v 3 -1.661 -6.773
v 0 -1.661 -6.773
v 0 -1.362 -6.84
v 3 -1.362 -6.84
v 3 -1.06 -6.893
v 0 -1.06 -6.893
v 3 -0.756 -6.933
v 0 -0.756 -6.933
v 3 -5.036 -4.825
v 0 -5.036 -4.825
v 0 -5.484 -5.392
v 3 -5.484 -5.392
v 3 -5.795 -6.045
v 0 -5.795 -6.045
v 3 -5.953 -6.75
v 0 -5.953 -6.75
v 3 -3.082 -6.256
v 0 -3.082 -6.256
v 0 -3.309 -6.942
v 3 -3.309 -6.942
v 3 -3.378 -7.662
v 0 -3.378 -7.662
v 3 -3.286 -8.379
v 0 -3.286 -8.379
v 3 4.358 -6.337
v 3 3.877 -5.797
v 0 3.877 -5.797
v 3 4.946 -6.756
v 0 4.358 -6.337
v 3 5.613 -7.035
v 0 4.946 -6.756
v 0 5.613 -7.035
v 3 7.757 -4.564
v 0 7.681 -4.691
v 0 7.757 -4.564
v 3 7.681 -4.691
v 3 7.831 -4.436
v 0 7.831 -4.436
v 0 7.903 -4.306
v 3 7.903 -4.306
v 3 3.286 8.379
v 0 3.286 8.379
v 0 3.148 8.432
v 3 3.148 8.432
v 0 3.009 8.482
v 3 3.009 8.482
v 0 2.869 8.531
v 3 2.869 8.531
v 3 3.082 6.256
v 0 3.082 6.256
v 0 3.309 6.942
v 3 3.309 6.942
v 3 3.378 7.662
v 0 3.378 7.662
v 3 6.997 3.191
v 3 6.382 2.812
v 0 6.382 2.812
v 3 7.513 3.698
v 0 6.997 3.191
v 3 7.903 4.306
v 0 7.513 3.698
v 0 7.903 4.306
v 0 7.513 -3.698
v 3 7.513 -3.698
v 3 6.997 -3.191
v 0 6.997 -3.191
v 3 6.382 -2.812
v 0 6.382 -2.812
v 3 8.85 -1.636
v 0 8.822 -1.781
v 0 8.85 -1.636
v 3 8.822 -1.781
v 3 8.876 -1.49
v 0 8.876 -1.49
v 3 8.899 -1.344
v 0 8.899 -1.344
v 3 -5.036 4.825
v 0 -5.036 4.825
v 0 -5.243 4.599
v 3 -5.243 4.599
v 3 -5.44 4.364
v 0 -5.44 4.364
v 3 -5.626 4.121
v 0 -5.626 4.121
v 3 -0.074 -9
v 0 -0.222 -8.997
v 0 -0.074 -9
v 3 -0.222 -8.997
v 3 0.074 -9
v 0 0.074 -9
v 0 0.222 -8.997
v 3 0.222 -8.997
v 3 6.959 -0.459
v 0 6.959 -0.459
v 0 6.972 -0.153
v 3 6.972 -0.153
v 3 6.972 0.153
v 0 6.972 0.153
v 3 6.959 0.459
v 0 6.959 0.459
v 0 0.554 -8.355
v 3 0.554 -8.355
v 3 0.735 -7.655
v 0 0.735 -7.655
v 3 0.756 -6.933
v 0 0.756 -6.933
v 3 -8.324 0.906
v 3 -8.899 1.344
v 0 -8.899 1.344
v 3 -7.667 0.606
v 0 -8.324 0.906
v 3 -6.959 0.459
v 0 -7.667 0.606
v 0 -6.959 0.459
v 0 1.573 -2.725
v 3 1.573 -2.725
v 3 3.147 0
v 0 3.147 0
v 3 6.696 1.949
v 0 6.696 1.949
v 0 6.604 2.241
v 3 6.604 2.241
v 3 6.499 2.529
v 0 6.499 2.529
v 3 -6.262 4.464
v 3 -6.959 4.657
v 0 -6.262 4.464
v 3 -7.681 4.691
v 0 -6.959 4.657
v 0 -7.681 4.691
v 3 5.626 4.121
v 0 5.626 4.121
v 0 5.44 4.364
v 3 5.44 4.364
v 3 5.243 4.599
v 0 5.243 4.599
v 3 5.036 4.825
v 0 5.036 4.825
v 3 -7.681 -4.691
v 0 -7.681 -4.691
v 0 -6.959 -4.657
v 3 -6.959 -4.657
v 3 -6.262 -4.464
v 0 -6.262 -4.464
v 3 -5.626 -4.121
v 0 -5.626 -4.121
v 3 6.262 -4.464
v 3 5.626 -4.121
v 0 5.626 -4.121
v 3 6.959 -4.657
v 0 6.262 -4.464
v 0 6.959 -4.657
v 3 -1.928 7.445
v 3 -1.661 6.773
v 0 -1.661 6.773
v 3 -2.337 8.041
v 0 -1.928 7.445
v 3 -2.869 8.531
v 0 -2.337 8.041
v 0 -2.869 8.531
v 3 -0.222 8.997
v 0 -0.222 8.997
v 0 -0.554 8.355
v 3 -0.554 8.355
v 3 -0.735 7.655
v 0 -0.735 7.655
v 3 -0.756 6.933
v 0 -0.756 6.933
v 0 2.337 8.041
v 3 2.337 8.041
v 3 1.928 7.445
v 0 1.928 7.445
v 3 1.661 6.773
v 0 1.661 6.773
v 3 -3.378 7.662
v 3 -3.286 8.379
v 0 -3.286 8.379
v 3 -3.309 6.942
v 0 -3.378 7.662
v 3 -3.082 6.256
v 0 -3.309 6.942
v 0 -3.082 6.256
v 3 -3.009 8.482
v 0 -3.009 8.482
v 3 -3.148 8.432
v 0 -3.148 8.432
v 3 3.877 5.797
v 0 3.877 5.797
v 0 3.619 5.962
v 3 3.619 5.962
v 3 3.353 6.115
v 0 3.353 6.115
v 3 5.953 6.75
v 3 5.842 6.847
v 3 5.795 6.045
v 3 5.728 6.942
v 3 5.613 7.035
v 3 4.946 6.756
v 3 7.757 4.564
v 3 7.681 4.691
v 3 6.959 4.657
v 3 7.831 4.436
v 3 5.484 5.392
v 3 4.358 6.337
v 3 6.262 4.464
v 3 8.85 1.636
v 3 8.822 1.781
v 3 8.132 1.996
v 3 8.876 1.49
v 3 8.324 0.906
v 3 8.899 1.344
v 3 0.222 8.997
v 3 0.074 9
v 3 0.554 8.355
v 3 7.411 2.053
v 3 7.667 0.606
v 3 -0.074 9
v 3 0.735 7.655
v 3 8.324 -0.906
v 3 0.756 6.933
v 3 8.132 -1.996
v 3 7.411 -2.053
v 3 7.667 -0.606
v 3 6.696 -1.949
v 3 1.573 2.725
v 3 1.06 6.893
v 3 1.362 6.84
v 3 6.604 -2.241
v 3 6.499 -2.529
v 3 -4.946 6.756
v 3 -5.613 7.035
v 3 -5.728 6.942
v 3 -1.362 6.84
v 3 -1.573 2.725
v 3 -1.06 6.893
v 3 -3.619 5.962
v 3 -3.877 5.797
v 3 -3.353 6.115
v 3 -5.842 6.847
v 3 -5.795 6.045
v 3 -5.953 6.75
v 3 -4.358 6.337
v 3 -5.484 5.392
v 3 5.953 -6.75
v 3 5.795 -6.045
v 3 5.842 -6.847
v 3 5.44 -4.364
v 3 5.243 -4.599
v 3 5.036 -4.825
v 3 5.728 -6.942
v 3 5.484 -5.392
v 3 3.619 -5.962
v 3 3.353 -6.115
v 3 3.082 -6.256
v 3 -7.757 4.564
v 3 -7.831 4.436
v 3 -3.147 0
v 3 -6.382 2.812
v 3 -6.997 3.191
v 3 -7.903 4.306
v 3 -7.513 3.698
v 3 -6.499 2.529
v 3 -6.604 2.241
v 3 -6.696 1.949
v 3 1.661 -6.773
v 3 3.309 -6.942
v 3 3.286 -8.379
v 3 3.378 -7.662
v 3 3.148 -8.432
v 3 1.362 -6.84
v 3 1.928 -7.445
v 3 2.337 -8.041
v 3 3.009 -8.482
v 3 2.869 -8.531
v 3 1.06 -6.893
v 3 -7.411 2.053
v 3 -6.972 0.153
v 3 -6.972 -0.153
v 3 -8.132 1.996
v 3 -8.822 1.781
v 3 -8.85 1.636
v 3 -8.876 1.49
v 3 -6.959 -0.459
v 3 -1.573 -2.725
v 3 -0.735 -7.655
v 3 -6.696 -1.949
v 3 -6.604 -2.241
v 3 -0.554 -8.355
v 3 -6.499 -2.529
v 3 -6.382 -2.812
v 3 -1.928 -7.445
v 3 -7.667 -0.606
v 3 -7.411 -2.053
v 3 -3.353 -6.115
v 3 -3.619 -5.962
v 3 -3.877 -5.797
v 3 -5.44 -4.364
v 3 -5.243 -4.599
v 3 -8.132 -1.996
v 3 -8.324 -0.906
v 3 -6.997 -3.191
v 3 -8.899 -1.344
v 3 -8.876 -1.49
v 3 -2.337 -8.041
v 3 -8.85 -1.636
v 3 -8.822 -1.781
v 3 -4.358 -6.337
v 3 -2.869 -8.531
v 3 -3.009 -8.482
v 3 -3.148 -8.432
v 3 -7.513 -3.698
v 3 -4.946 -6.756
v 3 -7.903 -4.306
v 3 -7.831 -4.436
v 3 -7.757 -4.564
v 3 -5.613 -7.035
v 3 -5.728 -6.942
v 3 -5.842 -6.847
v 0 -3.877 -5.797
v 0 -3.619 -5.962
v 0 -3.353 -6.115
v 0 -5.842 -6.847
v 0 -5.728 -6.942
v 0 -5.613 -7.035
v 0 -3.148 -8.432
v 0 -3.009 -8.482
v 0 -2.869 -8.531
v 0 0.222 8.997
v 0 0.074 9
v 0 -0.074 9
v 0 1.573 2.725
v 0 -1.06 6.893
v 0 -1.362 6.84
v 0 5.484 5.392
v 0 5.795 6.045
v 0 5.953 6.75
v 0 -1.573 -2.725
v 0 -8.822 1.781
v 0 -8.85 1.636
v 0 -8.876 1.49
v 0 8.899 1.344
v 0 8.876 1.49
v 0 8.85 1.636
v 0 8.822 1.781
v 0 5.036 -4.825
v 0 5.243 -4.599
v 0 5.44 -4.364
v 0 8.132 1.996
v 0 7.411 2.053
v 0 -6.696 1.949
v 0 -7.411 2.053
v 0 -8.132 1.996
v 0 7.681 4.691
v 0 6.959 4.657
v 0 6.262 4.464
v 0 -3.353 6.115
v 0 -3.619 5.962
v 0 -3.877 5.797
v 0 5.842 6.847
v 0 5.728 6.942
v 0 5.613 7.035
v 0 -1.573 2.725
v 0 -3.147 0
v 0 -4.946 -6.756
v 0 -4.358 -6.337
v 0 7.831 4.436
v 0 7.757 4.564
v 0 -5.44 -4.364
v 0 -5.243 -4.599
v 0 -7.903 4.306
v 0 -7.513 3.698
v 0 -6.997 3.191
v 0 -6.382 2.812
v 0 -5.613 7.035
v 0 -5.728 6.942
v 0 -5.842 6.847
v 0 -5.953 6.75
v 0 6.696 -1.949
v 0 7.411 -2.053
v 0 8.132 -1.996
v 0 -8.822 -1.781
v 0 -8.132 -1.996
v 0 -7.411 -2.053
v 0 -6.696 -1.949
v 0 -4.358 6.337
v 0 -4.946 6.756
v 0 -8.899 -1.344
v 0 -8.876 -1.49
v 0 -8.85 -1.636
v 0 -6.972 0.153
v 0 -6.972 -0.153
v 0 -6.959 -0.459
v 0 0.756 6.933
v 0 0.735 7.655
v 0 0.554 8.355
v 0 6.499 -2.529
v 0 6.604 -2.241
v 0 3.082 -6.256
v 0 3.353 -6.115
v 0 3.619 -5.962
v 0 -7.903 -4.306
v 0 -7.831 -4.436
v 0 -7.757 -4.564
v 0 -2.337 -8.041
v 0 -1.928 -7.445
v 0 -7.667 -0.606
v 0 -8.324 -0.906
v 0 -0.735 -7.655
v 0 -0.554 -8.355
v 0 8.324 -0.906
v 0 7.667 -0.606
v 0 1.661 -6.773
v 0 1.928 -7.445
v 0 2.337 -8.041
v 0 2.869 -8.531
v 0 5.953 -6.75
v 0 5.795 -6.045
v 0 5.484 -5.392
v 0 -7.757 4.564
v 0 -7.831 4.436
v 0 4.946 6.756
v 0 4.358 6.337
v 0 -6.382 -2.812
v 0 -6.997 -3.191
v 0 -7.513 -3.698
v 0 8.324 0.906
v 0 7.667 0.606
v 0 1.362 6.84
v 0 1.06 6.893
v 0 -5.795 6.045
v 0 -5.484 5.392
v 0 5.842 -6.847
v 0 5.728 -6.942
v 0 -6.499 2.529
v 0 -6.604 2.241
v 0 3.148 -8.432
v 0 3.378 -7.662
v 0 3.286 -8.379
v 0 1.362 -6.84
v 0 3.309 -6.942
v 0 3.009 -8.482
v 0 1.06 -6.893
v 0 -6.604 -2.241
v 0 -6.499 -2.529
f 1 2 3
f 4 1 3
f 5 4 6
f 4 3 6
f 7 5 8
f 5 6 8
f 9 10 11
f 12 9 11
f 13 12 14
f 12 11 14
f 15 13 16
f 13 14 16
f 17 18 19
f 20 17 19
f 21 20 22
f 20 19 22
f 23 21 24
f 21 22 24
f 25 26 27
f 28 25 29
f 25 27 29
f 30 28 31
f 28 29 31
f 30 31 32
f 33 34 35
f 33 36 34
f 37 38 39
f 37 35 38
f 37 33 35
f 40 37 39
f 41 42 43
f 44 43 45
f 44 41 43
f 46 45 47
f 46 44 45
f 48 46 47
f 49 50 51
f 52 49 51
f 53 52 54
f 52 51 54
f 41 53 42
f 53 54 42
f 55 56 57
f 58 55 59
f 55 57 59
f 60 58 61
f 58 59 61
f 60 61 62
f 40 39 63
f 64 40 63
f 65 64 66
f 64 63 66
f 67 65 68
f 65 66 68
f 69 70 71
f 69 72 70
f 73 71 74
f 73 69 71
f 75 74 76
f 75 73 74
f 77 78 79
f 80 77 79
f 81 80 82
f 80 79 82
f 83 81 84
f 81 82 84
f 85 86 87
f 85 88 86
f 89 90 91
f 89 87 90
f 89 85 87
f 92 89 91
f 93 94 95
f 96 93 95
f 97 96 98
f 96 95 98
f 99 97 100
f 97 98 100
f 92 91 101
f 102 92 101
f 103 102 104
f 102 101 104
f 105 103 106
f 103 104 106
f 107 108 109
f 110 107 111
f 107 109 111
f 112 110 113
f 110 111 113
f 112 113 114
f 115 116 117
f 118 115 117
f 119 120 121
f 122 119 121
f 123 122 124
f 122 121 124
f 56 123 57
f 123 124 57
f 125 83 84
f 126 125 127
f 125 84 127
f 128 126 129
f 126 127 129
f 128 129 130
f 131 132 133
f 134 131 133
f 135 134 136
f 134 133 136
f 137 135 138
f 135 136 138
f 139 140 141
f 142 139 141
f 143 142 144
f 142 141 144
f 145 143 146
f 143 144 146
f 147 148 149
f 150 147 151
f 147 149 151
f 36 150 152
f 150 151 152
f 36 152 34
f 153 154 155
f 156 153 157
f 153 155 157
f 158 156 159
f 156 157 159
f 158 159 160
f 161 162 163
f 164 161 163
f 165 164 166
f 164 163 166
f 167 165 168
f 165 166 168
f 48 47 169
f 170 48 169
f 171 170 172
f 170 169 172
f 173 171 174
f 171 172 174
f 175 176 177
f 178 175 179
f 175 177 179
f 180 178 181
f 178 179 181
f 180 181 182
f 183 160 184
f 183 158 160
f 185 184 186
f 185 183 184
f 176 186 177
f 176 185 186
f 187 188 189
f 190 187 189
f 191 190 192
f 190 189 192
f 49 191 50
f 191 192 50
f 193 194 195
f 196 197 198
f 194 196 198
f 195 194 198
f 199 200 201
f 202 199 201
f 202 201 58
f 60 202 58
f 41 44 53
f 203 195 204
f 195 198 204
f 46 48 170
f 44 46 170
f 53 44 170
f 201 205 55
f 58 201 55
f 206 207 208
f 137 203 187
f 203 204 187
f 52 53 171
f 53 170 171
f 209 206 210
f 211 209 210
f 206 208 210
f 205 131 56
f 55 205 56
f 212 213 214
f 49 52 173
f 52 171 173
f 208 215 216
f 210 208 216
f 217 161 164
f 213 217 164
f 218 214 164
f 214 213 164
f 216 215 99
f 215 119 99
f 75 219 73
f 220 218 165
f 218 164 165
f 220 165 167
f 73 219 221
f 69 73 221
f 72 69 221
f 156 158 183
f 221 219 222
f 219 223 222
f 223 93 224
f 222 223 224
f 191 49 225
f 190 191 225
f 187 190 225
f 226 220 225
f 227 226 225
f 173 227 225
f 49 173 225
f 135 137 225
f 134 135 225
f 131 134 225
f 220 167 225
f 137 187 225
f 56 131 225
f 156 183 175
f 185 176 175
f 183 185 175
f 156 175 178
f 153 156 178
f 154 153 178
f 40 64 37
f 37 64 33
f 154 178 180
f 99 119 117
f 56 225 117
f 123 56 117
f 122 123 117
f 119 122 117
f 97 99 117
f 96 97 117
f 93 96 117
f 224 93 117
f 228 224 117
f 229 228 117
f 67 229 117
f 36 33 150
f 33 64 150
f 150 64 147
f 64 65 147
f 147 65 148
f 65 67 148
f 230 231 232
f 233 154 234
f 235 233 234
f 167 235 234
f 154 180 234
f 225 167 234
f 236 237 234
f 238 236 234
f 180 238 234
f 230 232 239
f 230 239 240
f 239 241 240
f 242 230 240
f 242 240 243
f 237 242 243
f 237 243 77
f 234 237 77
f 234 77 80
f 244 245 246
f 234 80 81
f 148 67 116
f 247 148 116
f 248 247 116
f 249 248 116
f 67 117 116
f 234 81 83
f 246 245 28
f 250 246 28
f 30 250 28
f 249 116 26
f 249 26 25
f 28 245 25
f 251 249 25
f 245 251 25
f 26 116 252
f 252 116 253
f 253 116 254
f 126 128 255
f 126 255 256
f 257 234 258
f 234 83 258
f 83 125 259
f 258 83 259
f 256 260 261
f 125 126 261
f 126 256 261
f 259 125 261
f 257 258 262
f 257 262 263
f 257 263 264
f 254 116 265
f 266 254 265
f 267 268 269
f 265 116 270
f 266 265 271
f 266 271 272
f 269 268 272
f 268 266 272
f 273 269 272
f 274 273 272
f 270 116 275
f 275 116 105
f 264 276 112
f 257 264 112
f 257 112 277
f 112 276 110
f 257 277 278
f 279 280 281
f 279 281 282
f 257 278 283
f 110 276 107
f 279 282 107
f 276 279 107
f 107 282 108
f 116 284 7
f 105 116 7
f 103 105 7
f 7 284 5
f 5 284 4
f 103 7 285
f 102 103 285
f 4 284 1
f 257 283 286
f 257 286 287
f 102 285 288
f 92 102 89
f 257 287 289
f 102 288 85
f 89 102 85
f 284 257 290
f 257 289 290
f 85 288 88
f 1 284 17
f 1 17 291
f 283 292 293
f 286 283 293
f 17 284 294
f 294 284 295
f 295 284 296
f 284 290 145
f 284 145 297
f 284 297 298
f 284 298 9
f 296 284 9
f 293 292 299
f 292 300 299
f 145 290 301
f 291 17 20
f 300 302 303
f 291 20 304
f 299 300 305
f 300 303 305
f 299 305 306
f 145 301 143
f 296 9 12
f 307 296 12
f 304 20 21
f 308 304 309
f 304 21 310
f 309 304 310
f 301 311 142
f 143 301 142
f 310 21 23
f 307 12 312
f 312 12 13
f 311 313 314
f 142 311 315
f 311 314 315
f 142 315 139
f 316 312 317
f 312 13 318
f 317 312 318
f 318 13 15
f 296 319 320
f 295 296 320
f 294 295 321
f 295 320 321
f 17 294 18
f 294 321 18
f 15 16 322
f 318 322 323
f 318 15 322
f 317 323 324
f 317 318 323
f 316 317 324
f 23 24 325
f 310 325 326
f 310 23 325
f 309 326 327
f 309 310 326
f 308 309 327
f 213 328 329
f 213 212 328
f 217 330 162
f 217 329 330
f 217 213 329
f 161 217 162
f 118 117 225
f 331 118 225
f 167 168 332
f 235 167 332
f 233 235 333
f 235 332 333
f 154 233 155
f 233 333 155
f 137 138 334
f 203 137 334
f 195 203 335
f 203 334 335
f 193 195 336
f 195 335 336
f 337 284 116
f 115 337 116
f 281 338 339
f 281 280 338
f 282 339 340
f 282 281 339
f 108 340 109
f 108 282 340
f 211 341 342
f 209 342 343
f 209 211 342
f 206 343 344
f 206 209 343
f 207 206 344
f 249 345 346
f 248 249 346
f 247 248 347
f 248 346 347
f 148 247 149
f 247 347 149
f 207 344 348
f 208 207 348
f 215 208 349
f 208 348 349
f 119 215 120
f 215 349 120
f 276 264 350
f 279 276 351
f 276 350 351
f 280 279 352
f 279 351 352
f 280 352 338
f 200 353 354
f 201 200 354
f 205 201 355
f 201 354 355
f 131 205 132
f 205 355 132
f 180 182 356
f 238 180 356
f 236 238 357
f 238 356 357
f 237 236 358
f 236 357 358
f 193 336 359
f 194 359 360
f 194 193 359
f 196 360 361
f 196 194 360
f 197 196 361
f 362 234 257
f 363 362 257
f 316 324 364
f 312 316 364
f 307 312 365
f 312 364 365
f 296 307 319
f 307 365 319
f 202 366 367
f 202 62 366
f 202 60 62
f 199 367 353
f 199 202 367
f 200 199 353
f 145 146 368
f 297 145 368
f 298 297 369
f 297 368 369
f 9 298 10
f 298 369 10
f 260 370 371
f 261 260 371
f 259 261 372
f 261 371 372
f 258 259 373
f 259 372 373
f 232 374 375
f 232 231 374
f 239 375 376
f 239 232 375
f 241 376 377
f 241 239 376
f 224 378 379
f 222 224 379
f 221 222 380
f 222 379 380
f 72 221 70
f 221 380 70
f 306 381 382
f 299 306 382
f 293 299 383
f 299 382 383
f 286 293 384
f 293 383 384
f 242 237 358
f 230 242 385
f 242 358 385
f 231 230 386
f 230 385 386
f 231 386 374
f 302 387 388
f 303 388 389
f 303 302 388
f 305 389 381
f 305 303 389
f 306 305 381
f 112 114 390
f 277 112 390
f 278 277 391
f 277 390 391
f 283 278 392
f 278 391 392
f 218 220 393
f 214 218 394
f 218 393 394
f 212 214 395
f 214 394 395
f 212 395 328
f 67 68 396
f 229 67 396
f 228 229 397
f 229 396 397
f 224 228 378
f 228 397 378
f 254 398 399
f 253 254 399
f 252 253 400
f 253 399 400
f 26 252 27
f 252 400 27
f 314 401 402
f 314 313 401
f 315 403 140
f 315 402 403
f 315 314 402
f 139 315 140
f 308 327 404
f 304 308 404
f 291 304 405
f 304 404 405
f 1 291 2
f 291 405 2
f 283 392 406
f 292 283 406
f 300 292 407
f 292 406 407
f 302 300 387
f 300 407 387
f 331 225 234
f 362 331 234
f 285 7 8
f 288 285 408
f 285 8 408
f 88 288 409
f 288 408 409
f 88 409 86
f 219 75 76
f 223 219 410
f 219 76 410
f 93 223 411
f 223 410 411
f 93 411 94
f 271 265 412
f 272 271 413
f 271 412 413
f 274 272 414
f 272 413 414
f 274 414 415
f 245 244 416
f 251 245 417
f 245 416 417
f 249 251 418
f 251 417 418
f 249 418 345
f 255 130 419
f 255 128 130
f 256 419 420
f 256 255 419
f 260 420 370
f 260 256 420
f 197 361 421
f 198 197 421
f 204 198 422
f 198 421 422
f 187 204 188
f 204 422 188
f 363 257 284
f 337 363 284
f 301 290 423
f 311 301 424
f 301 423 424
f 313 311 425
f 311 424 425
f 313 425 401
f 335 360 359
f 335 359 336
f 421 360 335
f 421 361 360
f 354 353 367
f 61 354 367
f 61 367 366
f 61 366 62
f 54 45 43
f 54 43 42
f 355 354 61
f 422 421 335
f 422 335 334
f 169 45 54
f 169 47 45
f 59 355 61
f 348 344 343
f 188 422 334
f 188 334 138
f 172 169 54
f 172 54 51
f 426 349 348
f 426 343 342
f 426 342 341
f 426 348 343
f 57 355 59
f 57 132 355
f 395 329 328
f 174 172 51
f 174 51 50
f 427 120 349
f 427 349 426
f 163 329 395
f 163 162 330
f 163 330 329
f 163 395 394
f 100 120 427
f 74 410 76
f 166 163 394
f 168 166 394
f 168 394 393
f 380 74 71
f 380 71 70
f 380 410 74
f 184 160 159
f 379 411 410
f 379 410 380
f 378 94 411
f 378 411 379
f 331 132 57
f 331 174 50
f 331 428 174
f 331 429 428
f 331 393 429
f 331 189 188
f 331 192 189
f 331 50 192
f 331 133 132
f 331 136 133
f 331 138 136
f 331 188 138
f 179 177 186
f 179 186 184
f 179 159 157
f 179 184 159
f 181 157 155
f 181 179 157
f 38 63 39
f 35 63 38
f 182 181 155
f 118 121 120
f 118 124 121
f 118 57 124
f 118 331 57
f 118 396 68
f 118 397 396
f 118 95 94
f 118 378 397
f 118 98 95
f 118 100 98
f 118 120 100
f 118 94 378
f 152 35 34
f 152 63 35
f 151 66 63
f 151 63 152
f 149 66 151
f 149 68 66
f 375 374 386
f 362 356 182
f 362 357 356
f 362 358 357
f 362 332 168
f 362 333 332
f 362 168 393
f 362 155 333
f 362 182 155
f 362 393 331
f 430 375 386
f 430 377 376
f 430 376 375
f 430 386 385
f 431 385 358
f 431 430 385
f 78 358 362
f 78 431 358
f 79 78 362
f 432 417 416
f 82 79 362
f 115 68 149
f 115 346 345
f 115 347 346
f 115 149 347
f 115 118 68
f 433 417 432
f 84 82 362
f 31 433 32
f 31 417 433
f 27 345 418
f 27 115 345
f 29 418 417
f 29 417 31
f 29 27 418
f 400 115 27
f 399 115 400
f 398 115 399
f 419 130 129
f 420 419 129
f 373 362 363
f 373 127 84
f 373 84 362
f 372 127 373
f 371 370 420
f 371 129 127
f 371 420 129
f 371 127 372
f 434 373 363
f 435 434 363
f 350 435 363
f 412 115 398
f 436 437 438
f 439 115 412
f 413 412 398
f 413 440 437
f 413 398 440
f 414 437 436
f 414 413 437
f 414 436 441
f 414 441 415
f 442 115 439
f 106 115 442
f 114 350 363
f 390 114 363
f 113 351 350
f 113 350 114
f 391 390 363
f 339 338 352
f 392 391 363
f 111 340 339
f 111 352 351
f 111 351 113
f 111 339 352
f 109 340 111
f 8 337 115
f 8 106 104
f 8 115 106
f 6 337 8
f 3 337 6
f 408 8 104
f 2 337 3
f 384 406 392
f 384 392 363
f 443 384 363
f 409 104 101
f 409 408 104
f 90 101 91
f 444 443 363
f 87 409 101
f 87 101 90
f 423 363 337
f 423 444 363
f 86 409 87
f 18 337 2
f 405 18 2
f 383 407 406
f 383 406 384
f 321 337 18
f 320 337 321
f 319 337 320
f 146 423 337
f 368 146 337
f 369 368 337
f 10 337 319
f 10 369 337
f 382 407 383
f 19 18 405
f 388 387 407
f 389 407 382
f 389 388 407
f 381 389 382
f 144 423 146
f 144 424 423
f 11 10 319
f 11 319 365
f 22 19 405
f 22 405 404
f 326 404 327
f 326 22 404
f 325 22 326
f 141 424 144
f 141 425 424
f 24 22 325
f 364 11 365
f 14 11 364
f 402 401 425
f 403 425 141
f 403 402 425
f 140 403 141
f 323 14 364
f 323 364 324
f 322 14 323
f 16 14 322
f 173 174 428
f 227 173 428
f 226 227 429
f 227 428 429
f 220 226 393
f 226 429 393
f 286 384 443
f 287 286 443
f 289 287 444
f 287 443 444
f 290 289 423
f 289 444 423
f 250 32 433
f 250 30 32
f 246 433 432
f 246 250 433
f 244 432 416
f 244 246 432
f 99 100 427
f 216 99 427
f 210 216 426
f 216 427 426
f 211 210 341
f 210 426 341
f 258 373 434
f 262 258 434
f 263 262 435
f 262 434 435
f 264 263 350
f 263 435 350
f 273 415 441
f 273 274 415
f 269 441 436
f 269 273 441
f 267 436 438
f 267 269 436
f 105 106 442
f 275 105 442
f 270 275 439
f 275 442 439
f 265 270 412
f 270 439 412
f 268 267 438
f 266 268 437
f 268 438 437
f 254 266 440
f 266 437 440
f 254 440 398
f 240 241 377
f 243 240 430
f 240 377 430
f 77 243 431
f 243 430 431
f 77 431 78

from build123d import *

# Parameters (mm, degrees)
BASPROSKE_W        = 3
BASPROSKE_H        = 9
TOOTHCUT_DEPTH     = 14.076696831
TEETHCUTS_COUNT    = 18
TEETHCUTS_ANGLE    = 340
CUT_EXTRUDE1_DEPTH = 14.007462246


with BuildPart() as part:
    # BasProSke → Base-Revolve (revolve)
    with BuildSketch(Plane(origin=(0, 0, 0), x_dir=(1, 0, 0), z_dir=(0, 1, 0)), mode=Mode.PRIVATE) as base_revolve_sk:
        with Locations((1.5, 4.5)):
            Rectangle(BASPROSKE_W, BASPROSKE_H)
    revolve(base_revolve_sk.sketch.rotate(Axis((-10, 0, 0), (1, 0, 0)), 180), axis=Axis((-10, 0, 0), (1, 0, 0)))

    # TooCutSke → ToothCut (cut, through all)
    with BuildSketch(Plane(origin=(0, 0, 0), x_dir=(0, 0, -1), z_dir=(1, 0, 0))):
        with BuildLine():
            ThreePointArc((0.45926649, 6.958861278), (0, 6.974), (-0.45926649, 6.958861278))
            ThreePointArc((-0.45926649, 6.958861278), (-0.743858876, 8.01799277), (-1.365479267, 8.921508366))
            ThreePointArc((-1.365479267, 8.921508366), (0, 9.0254), (1.365479267, 8.921508366))
            ThreePointArc((1.365479267, 8.921508366), (0.743858876, 8.01799277), (0.45926649, 6.958861278))
        make_face()
    toothcut = extrude(amount=TOOTHCUT_DEPTH, mode=Mode.SUBTRACT)

    # TeethCuts: ToothCut ×18 about axis
    teethcuts_axis = Axis((-10, 0, 0), (1, 0, 0))
    for i in range(1, TEETHCUTS_COUNT):
        add(toothcut.rotate(teethcuts_axis, i * TEETHCUTS_ANGLE / (TEETHCUTS_COUNT - 1)), mode=Mode.SUBTRACT)

    # Sketch1 → Cut-Extrude1 (cut, through all)
    with BuildSketch(Plane(origin=(3, 0, 0), x_dir=(0, 0, -1), z_dir=(1, 0, 0))):
        Polygon((0, 3.146558967), (-2.725, 1.573279484), (-2.725, -1.573279484), (0, -3.146558967), (2.725, -1.573279484), (2.725, 1.573279484), align=None)
    extrude(amount=-CUT_EXTRUDE1_DEPTH, mode=Mode.SUBTRACT)


solid = part.part
